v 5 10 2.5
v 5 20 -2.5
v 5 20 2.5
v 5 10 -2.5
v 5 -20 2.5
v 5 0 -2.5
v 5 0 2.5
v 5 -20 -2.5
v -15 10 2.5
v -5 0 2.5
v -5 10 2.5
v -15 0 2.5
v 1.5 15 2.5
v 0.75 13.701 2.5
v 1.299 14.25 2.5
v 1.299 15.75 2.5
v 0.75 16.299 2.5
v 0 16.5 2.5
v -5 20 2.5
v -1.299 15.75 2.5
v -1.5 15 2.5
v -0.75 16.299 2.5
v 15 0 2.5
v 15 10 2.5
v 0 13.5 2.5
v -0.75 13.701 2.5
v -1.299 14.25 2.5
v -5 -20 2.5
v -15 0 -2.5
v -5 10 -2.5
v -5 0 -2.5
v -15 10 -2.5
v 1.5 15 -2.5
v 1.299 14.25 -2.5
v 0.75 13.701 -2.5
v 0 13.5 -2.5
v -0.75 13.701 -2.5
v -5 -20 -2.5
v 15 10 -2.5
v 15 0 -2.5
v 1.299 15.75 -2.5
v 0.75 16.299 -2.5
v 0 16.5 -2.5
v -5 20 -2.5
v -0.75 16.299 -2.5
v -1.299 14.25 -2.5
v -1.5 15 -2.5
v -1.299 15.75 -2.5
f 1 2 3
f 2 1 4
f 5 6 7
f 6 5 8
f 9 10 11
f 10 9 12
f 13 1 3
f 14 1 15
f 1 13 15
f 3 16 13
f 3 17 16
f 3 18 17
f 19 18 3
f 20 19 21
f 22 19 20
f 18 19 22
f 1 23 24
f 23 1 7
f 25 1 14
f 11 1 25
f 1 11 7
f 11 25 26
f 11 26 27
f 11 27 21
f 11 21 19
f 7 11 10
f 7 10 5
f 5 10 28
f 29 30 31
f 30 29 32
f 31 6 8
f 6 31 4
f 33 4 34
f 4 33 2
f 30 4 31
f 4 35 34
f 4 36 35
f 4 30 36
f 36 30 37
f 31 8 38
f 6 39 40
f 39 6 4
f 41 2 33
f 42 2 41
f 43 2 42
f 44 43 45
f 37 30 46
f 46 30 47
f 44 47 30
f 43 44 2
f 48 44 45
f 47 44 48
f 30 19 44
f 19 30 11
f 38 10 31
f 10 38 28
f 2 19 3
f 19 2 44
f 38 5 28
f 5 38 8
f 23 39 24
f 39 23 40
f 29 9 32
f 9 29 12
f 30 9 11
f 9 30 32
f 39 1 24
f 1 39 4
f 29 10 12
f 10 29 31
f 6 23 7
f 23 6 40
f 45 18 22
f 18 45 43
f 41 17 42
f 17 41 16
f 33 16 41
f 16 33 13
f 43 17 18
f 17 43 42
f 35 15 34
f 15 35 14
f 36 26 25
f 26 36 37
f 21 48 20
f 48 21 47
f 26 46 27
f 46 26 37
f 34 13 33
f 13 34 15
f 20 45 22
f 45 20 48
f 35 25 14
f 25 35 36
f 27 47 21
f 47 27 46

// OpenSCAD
module cross () {
	union () {
		// The vertical
		cube (size = [10, 40, 5], center = true);
		// The horizontal
		translate (v = [0, 5, 0])
			cube (size = [30, 10, 5], center = true);
	}
}

difference () {
	cross ();
	translate (v = [0, 15, 0])
		cylinder (h = 7, r = 1.5, $fn = 12, center = true);
}
